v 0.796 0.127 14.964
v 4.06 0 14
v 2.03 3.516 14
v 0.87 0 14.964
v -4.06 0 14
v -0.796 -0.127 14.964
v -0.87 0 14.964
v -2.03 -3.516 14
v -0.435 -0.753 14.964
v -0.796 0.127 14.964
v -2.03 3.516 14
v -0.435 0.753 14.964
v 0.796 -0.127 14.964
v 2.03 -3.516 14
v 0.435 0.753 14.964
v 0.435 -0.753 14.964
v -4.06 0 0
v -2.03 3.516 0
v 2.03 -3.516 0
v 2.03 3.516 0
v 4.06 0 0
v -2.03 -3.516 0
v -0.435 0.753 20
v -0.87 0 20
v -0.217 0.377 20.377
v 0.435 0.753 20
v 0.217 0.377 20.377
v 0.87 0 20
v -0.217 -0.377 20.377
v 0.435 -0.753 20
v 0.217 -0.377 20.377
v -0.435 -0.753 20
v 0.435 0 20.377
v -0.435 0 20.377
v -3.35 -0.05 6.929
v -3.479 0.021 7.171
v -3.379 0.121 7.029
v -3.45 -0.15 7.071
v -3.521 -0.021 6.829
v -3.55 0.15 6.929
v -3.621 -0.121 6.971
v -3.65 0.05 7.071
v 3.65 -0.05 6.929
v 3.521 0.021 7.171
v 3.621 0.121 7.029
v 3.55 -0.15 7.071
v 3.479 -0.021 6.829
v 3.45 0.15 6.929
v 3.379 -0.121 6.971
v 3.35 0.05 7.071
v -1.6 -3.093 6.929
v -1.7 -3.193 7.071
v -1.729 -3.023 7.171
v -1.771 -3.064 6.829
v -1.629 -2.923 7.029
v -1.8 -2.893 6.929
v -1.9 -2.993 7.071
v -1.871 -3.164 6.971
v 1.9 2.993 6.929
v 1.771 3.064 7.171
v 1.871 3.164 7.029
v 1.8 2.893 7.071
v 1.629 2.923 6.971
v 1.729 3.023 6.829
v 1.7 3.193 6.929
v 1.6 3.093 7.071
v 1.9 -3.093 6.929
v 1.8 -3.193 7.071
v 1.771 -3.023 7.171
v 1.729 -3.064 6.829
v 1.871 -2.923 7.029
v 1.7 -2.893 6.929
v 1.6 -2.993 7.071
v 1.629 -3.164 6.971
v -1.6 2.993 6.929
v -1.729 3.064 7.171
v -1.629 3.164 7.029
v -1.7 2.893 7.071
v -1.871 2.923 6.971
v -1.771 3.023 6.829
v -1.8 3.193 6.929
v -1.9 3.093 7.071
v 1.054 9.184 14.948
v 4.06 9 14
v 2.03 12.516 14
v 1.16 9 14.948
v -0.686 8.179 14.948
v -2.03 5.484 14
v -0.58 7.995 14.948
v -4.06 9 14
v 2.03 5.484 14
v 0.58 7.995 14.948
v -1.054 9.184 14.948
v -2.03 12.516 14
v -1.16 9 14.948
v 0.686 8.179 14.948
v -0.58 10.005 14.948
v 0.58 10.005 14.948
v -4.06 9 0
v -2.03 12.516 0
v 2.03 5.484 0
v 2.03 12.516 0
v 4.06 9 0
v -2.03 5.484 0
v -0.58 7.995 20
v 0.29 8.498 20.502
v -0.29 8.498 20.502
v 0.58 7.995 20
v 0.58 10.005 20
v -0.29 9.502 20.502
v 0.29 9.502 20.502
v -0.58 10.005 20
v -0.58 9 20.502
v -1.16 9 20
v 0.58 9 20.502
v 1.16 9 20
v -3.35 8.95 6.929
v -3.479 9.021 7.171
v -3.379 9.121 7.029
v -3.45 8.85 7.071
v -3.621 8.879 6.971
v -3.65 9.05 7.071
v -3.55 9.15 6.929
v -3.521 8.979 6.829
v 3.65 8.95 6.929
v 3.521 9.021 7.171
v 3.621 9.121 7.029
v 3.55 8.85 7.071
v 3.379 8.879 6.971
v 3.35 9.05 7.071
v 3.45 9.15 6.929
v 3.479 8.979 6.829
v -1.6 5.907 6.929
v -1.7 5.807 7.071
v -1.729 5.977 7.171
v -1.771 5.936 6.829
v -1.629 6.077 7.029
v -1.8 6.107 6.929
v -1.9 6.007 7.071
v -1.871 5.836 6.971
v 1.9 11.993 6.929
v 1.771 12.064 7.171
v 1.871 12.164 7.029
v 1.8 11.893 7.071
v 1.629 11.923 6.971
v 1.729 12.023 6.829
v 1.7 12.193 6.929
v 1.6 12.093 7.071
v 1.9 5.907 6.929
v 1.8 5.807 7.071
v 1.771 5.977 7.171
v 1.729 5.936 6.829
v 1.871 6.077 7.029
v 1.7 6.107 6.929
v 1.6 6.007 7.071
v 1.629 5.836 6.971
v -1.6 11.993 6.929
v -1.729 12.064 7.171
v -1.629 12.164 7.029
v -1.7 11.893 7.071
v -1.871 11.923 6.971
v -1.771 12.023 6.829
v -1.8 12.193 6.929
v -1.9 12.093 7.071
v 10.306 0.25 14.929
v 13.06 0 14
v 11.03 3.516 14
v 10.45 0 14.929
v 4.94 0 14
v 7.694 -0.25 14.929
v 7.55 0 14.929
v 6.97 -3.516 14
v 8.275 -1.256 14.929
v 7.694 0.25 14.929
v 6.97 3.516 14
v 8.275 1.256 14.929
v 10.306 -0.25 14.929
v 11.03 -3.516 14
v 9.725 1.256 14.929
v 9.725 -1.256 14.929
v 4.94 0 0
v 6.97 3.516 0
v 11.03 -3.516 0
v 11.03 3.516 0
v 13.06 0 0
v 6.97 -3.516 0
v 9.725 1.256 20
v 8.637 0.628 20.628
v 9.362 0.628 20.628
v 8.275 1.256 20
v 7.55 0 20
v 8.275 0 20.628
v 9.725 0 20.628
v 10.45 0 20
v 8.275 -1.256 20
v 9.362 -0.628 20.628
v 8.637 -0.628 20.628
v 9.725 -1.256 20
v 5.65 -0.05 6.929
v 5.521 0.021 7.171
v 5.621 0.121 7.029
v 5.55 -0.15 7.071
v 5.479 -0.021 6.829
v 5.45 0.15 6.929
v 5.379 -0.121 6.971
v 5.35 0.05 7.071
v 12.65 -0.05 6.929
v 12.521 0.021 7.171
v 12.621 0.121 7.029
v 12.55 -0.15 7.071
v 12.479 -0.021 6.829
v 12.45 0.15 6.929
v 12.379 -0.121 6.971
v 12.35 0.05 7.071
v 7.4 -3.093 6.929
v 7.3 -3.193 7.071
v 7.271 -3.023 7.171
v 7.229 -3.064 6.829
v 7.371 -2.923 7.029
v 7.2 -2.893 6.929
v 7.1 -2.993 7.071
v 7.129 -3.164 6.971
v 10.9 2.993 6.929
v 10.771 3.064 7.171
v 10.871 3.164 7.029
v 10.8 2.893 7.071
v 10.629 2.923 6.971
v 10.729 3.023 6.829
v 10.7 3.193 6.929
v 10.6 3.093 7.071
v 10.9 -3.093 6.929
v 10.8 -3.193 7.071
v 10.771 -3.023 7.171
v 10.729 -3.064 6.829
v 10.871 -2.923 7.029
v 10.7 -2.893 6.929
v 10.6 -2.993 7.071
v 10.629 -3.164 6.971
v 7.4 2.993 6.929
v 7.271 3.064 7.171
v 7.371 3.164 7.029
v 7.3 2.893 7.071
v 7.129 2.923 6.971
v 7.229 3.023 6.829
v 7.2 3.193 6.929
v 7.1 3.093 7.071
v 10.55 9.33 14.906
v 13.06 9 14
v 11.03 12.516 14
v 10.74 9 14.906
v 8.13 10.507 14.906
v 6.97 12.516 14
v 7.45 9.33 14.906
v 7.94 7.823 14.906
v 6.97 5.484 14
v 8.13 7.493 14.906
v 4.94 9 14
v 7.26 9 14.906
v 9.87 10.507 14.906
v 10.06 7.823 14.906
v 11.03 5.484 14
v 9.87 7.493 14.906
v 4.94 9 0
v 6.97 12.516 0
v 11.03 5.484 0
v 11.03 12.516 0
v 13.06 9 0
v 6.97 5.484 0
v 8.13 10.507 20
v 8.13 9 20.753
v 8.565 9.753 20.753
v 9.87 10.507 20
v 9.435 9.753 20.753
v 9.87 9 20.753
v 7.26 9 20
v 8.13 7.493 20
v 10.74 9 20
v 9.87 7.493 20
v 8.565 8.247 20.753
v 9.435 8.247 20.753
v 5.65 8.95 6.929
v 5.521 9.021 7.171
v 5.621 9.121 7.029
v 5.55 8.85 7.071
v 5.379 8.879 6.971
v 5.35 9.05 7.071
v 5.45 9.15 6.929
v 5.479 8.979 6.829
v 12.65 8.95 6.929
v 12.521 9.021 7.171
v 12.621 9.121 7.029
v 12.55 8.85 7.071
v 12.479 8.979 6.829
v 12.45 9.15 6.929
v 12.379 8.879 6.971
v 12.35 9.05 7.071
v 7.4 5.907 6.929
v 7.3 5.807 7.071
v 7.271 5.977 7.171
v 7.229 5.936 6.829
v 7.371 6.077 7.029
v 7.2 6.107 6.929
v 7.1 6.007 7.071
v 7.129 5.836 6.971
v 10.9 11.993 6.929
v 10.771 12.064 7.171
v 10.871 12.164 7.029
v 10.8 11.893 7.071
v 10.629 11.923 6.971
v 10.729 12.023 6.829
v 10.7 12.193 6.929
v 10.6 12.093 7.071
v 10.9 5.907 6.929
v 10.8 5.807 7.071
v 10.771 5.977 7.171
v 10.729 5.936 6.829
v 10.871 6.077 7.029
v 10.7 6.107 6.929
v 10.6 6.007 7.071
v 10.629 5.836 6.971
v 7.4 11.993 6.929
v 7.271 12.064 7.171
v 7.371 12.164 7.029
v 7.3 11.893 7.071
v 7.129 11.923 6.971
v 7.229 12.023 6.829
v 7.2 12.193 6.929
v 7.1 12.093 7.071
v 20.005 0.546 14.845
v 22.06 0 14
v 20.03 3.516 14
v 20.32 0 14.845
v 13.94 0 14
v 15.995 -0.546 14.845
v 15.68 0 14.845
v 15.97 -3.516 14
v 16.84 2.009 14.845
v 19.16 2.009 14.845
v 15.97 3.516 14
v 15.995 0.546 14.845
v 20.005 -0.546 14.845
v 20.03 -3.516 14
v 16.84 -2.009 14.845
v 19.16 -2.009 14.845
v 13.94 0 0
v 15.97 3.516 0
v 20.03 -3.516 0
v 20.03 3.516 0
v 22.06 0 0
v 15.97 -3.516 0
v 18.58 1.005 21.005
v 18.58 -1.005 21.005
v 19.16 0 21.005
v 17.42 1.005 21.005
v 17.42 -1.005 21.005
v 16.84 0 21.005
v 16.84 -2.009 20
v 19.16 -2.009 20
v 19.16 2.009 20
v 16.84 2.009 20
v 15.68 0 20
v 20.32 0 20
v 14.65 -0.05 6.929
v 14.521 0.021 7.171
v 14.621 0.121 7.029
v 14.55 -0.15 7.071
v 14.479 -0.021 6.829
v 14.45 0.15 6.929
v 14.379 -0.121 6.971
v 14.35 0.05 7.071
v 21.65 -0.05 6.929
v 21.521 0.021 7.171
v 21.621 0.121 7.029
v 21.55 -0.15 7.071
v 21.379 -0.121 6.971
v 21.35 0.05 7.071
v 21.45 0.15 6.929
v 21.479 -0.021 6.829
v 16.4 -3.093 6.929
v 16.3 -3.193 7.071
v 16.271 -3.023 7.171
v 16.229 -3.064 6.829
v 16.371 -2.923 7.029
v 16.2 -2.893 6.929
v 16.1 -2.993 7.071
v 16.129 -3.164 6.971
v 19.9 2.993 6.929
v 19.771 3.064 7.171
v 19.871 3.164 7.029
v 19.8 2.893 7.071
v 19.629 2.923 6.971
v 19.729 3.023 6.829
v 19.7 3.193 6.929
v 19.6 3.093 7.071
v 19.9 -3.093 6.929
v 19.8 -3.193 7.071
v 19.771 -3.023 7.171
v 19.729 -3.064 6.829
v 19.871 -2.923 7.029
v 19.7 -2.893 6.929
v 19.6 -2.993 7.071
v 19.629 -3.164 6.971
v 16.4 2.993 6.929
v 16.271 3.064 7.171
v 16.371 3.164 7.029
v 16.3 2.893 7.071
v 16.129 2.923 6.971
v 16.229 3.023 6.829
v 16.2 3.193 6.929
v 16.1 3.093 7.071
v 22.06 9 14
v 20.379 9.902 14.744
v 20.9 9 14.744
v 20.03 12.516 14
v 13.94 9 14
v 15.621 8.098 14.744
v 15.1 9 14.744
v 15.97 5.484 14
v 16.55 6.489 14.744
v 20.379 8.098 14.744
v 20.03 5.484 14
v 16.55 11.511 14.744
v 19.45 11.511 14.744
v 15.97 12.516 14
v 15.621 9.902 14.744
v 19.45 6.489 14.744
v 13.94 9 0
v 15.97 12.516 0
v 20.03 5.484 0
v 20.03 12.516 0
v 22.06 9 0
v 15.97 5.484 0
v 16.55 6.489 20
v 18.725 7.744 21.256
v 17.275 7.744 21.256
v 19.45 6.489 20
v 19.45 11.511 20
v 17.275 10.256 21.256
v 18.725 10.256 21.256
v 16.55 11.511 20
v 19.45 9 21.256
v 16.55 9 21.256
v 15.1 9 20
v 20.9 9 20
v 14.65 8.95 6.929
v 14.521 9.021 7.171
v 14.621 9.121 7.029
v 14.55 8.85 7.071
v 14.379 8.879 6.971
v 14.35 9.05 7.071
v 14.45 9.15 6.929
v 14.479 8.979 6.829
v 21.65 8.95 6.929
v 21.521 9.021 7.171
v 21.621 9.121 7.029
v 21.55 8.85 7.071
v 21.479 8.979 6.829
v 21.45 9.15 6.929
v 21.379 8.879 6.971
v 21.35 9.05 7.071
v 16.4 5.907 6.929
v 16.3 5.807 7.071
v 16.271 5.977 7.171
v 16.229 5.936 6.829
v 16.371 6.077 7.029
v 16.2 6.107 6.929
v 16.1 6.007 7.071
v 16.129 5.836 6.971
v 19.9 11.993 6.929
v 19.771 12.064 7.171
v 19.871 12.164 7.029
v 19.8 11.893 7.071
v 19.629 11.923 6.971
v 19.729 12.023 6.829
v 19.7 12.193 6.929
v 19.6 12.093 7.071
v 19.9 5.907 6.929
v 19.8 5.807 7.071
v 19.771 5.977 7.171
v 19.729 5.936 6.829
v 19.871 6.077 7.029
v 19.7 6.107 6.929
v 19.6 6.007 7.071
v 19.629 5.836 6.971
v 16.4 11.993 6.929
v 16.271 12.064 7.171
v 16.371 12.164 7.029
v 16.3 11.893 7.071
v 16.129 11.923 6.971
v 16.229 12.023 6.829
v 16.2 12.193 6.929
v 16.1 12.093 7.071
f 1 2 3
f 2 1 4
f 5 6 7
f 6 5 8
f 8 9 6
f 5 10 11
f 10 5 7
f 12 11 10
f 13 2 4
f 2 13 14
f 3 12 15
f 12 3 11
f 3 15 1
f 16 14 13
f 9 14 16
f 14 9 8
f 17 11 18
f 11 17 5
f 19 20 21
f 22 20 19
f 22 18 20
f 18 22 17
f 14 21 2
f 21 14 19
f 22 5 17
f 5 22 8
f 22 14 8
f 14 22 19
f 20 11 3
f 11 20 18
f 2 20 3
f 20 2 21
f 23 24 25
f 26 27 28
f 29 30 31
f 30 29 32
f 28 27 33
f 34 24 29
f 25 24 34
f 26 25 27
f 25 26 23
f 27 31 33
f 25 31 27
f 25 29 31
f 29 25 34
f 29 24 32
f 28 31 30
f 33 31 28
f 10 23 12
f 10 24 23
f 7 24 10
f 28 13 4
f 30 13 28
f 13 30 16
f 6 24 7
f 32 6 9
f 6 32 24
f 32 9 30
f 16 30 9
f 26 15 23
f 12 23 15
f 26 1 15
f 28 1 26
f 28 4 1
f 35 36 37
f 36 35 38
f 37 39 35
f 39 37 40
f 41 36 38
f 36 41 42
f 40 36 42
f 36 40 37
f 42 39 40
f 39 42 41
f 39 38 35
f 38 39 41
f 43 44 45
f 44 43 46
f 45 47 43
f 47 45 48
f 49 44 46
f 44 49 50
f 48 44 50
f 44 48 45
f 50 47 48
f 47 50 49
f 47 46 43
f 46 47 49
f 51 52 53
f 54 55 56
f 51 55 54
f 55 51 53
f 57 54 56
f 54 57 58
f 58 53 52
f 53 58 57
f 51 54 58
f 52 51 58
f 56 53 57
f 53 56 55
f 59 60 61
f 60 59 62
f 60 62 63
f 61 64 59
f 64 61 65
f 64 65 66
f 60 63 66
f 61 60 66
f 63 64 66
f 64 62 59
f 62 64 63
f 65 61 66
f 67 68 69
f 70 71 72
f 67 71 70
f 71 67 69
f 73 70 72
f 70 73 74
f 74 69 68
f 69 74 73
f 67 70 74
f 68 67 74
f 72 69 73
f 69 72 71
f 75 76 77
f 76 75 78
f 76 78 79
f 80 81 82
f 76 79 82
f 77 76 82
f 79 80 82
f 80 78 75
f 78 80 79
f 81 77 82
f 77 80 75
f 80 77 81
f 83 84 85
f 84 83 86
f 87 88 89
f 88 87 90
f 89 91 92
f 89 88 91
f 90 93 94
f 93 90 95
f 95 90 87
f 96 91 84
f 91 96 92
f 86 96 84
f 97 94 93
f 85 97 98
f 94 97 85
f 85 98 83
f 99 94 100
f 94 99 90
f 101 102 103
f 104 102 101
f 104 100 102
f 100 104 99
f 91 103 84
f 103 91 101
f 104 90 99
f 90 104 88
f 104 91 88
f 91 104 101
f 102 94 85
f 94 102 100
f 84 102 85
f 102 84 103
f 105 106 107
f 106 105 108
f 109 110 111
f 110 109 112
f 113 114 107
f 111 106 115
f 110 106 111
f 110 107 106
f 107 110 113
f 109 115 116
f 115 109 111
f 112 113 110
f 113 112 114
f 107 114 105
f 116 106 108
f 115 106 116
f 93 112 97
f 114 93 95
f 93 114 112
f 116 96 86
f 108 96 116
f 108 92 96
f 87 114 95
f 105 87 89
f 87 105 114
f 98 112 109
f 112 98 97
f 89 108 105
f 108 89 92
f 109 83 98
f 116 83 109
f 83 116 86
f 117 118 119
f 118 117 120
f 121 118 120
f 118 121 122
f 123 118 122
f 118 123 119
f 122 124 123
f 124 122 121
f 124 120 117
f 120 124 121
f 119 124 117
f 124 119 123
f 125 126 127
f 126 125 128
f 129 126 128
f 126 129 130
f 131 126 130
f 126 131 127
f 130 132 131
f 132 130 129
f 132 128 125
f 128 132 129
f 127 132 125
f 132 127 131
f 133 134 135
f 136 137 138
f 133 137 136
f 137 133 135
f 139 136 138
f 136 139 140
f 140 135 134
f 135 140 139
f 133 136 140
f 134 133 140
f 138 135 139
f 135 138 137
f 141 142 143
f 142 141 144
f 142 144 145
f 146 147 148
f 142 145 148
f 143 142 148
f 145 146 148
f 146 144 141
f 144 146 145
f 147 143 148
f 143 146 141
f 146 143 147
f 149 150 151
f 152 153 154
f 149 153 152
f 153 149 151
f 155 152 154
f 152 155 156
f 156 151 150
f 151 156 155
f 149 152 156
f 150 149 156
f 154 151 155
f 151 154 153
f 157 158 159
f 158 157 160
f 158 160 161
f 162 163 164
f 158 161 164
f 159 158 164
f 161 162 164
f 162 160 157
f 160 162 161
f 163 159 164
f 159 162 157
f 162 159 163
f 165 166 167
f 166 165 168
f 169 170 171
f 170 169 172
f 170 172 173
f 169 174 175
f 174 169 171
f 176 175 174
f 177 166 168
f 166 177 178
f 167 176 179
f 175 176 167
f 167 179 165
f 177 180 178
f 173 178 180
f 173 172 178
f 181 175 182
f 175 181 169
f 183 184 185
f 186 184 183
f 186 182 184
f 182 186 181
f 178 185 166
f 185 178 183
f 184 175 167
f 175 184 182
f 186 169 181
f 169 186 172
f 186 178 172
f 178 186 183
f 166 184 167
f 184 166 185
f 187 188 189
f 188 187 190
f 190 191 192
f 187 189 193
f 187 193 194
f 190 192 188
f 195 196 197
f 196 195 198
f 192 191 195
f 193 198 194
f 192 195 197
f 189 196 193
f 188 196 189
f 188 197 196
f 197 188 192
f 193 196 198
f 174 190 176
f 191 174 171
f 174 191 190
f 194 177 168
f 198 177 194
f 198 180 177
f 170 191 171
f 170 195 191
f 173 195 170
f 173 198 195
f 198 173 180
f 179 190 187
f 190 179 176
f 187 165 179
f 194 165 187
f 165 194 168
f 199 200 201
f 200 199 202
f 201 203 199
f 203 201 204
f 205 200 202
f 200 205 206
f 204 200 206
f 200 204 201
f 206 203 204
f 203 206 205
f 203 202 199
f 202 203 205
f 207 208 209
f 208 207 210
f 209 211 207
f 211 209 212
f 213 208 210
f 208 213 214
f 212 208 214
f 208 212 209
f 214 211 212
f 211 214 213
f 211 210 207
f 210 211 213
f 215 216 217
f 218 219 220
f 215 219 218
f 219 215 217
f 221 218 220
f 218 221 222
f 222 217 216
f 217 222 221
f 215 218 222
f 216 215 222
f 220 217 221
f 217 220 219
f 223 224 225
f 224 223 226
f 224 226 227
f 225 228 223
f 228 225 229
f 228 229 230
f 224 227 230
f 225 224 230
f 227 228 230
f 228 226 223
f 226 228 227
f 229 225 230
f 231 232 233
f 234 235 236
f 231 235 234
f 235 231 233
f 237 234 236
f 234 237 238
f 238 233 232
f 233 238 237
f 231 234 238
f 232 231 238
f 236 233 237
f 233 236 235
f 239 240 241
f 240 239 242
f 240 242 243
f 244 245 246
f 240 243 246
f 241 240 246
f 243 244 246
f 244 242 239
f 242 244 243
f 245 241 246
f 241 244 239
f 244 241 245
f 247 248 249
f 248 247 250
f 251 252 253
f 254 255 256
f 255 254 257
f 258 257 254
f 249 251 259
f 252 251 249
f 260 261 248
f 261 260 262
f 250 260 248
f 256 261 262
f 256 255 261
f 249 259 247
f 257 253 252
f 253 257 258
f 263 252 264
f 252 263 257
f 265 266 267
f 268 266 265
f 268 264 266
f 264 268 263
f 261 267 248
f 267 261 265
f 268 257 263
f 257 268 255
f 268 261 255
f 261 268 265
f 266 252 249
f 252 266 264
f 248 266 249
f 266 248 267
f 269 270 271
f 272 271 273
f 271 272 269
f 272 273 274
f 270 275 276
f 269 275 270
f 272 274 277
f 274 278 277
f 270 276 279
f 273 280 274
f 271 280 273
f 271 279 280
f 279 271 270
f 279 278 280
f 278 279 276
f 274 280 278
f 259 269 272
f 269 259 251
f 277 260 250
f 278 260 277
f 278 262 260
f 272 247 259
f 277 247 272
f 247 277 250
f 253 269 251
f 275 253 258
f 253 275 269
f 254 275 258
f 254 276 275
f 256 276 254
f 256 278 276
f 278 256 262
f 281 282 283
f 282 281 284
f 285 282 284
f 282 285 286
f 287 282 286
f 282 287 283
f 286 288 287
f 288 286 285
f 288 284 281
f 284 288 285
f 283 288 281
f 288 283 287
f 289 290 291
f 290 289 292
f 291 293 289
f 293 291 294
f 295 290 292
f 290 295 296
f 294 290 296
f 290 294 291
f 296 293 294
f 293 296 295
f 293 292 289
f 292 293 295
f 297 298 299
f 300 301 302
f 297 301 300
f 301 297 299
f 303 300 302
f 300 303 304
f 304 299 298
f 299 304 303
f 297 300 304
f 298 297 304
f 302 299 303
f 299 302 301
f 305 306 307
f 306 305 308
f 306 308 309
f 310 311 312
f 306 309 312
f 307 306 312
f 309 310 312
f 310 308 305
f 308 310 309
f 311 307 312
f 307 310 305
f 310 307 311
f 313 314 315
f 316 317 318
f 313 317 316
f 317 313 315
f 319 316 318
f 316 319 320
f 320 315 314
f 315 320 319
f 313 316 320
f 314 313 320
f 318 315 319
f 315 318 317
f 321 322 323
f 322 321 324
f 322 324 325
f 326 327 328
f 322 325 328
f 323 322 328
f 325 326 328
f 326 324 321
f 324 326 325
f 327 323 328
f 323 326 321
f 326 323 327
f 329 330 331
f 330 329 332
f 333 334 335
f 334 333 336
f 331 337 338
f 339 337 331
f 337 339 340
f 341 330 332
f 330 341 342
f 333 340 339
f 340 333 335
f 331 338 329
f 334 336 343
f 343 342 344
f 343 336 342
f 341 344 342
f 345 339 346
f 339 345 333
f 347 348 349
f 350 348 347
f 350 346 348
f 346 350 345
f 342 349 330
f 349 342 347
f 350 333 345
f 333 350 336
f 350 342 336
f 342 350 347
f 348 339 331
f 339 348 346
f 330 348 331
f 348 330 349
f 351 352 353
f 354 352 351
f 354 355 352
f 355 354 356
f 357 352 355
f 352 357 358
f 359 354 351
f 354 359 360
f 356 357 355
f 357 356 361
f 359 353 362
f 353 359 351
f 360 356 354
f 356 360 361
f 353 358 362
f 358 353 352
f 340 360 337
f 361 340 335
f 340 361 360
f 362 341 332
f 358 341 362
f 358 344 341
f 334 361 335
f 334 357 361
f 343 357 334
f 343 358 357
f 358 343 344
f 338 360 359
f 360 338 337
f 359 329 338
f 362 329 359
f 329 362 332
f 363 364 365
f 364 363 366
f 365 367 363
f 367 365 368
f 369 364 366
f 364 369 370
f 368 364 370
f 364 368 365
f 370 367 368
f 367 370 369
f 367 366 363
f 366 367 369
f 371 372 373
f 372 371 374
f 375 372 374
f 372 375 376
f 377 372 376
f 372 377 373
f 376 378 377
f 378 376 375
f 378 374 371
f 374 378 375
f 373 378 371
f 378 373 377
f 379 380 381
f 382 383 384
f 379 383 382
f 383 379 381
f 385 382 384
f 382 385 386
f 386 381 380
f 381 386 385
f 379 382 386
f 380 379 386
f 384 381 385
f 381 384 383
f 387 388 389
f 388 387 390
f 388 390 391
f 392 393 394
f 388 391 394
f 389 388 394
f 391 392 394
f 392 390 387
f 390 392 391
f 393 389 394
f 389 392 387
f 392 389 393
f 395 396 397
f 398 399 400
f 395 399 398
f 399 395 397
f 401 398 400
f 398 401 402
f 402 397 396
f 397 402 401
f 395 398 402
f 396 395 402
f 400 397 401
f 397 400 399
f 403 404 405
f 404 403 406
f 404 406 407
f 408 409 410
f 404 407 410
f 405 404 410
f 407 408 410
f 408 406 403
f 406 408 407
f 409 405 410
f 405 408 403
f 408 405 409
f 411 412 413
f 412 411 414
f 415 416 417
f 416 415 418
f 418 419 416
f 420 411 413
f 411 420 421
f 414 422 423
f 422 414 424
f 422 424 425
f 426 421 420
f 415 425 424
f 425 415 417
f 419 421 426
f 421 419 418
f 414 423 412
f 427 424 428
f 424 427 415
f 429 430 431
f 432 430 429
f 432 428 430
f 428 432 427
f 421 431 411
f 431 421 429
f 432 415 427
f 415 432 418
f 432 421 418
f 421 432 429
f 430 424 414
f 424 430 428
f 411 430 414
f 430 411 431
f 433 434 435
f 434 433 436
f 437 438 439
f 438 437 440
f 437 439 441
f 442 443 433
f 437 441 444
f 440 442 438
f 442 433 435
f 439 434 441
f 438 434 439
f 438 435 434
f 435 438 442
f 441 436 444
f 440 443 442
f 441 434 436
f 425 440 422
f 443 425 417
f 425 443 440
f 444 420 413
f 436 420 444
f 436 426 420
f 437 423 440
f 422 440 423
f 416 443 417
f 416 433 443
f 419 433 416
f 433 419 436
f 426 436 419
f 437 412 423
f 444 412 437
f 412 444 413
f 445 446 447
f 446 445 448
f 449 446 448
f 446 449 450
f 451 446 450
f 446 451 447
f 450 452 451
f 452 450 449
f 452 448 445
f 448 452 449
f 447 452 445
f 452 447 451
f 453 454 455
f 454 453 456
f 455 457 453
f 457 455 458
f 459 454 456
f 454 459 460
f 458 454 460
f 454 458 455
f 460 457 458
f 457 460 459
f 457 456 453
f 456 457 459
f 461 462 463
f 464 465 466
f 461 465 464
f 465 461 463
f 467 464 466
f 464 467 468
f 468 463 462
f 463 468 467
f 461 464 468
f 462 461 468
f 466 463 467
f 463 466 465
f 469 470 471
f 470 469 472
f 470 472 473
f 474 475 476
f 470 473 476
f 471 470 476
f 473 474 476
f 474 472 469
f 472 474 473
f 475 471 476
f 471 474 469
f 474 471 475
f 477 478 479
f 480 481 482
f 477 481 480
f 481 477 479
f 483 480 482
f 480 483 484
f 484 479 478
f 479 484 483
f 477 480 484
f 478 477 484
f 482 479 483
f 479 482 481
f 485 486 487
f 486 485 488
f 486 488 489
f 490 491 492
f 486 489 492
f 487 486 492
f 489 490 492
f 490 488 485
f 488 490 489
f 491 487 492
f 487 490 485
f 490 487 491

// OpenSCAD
// Hex bits

bit_type = "Hex"; // [Hex, Double Hex, Hex Socket, Square, Square Socket, Double Square, Star]
magnet_slot = "false"; // [true, false]
magnet_diameter = 6;
magnet_height = 3;
sizes = [1.5,2,2.5,3,4,5];
number = len(sizes);
bit_size = 7;
tip_length = 6;
bit_length = 14;
bit_spacing = 2;
xc = number;
yc = round(sqrt(number));
count = number;

if(bit_type == "Hex"){
    build_hex();
}

else if(bit_type == "Hex Socket"){
    build_hex_socket();
}

else if(bit_type == "Double Hex"){
    build_dbl_hex();
}


else if(bit_type == "Square"){
    build_square();
}


else if(bit_type == "Square Socket"){
    build_square_socket();
}


else if(bit_type == "Double Square"){
    build_dbl_square();
}

if(bit_type == "Star"){
    build_star();
}

module build_hex(){
     
    for (x = [0:xc-1]){
    for(y = [0:yc-1]){
    county = count-y;
    if(county > 0){
    difference(){
        union(){
    
    base(x,y);
    sizes = sizes*1.16;
    translate([x*(bit_size+bit_spacing), y*(bit_size+bit_spacing), tip_length+bit_length]) scale([1,1,.5]) sphere($fn=6,d=sizes[y+(yc*x)]);
    
    translate([x*(bit_size+bit_spacing),y*(bit_size+bit_spacing),bit_length]) linear_extrude (height = tip_length, center = false, convexity = 10) polygon(ngon(6, sizes[y+(yc*x)]/2));
    
    }
    notch_cut(x, y);
    }
}
}
count = count-x*yc;
}
}

module build_hex_socket(){
    for (x = [0:xc-1]){
    for(y = [0:yc-1]){
    county = count-y;
    if(county > 0){
        sizes = sizes*1.16;
    difference(){
    union(){
    base(x,y);
    translate([x*(bit_size+bit_spacing),y*(bit_size+bit_spacing),bit_length+1]) linear_extrude (height = tip_length, center = false, convexity = 10) polygon(ngon(30, sizes[y+(yc*x)]/2+1));
    
        translate([x*(bit_size+bit_spacing), y*(bit_size+bit_spacing), bit_length+2]) scale([1,1,.5]) sphere($fn=6,d=sizes[y+(yc*x)]);
    }
    
    translate([x*(bit_size+bit_spacing), y*(bit_size+bit_spacing), bit_length+2]) scale([1,1,.5]) sphere($fn=6,d=sizes[y+(yc*x)]);
    
    translate([x*(bit_size+bit_spacing),y*(bit_size+bit_spacing),bit_length+2]) linear_extrude (height = tip_length, center = false, convexity = 10) polygon(ngon(6, sizes[y+(yc*x)]/2));
    notch_cut(x, y);
    }
    echo(county, "add");
}
echo(count);
}
count = count-x*yc;
}
}

module build_dbl_hex(){
    
    for (x = [0:xc-1]){
    for(y = [0:yc-1]){
    county = count-y;
    if(county > 0){
    difference(){
        union(){
    base(x,y);
   sizes = sizes*1.16;
    translate([x*(bit_size+bit_spacing),y*(bit_size+bit_spacing),bit_length]) linear_extrude (height = tip_length, center = false, convexity = 10) polygon(ngon(6, sizes[y+(yc*x)]/2));
        translate([x*(bit_size+bit_spacing),y*(bit_size+bit_spacing),bit_length]) rotate(90) linear_extrude (height = tip_length, center = false, convexity = 10) polygon(ngon(6, sizes[y+(yc*x)]/2));
    }
    notch_cut(x,y);
}
    echo(county, "add");
}
echo(count);
}
count = count-x*yc;
}
}

module build_square(){
for (x = [0:xc-1]){
    for(y = [0:yc-1]){
    county = count-y;
    if(county > 0){
    difference(){
        union(){
        base(x,y);
       sizes = sizes*1.1;
        translate([x*(bit_size+bit_spacing),y*(bit_size+bit_spacing),bit_length]) linear_extrude (height = tip_length, center = false, convexity = 10) rotate(45) polygon(ngon(4, sizes[y+(yc*x)]/2));  
    }
    notch_cut(x,y);
    }
    echo(county, "add");
}
echo(count);
}
count = count-x*yc;
}

}

module build_square_socket(){
    for (x = [0:xc-1]){
    for(y = [0:yc-1]){
    county = count-y;
    if(county > 0){
    difference(){
    union(){
    base(x,y);
        sizes = sizes*1.1;
    translate([x*(bit_size+bit_spacing),y*(bit_size+bit_spacing),bit_length+1]) linear_extrude (height = tip_length, center = false, convexity = 10) polygon(ngon(30, sizes[y+(yc*x)]/2+1));
    
        translate([x*(bit_size+bit_spacing), y*(bit_size+bit_spacing), bit_length+2]) scale([1,1,.5]) sphere($fn=6,d=sizes[y+(yc*x)]);
    }
    
    translate([x*(bit_size+bit_spacing),y*(bit_size+bit_spacing),bit_length+2]) linear_extrude (height = tip_length, center = false, convexity = 10) rotate(45) polygon(ngon(4, sizes[y+(yc*x)]/2));
    
    notch_cut(x, y);
    }
    echo(county, "add");
}
echo(count);
}
count = count-x*yc;
}
}

module build_dbl_square(){
for (x = [0:xc-1]){
    for(y = [0:yc-1]){
    county = count-y;
    if(county > 0){
    difference(){
        union(){
        base(x,y);
        sizes = sizes*1.1;
        translate([x*(bit_size+bit_spacing),y*(bit_size+bit_spacing),bit_length]) linear_extrude (height = tip_length, center = false, convexity = 10) rotate(45) polygon(ngon(4, sizes[y+(yc*x)]/2)); 
        translate([x*(bit_size+bit_spacing),y*(bit_size+bit_spacing),bit_length]) linear_extrude (height = tip_length, center = false, convexity = 10) polygon(ngon(4, sizes[y+(yc*x)]/2)); 
    
    }
    notch_cut(x,y);
    }
    echo(county, "add");
}
echo(count);
}
count = count-x*yc;
}

}

module base(x,y){
   
       difference(){
        union(){
    if(bit_type == "Hex Socket" || bit_type == "Square Socket"){
        translate([x*(bit_size+bit_spacing),y*(bit_size+bit_spacing),bit_length]) cylinder($fn=6, height = 1, r1 = bit_size*1.16/2, r2 = sizes[y+(yc*x)]/2+1);
    }
    else{
     translate([x*(bit_size+bit_spacing),y*(bit_size+bit_spacing),bit_length]) cylinder($fn=6, height = 1, r1 = bit_size*1.16/2, r2 = sizes[y+(yc*x)]/2);
    }
    linear_extrude(height = bit_length,     center = false) translate([x*(bit_size+bit_spacing),y*(bit_size+bit_spacing),0]) polygon(ngon(6, bit_size*1.16/2));
}
 if(magnet_slot == "true"){
            translate([x*(bit_size+bit_spacing),y*(bit_size+bit_spacing),1]) cylinder($fn=30, height = magnet_height+.4, r1 = magnet_diameter/2+.2, r2 = magnet_diameter/2+.2);
        }

}
}
module build_star(){
    
    for (x = [0:xc-1]){
    for(y = [0:yc-1]){
    county = count-y;
    if(county > 0){
    difference(){
        union(){
    base(x,y);
   sizes = sizes*1.16;
    translate([x*(bit_size+bit_spacing),y*(bit_size+bit_spacing),bit_length]) linear_extrude (height = tip_length, center = false, convexity = 10) polygon(ngon(3, sizes[y+(yc*x)]/2));
        translate([x*(bit_size+bit_spacing),y*(bit_size+bit_spacing),bit_length]) rotate(180) linear_extrude (height = tip_length, center = false, convexity = 10) polygon(ngon(3, sizes[y+(yc*x)]/2));
    }
    notch_cut(x,y);
}
    echo(county, "add");
}
echo(count);
}
count = count-x*yc;
}
}

module notch_cut(x, y){
    // Notch Cut
        translate([x*(bit_size+bit_spacing)-bit_size/2,y*(bit_size+bit_spacing),bit_length/2]) rotate([45, 45, 45])cube(size = .2, center = true);
    translate([x*(bit_size+bit_spacing)+bit_size/2,y*(bit_size+bit_spacing),bit_length/2]) rotate([45, 45, 45])cube(size = .2, center = true);
        translate([x*(bit_size+bit_spacing)-bit_size/4,y*(bit_size+bit_spacing)-bit_size/2.3,bit_length/2]) rotate([45, 45, 45])cube(size = .2, center = true);
    translate([x*(bit_size+bit_spacing)+bit_size/4,y*(bit_size+bit_spacing)+bit_size/2.3,bit_length/2]) rotate([45, 45, 45])cube(size = .2, center = true);
    translate([x*(bit_size+bit_spacing)+bit_size/4,y*(bit_size+bit_spacing)-bit_size/2.3,bit_length/2]) rotate([45, 45, 45])cube(size = .2, center = true);
    translate([x*(bit_size+bit_spacing)-bit_size/4,y*(bit_size+bit_spacing)+bit_size/2.3,bit_length/2]) rotate([45, 45, 45])cube(size = .2, center = true);
}
function ngon(num, r) = 
    [for (i=[0:num-1], a=i*360/num) [ r*cos(a), r*sin(a)]];
